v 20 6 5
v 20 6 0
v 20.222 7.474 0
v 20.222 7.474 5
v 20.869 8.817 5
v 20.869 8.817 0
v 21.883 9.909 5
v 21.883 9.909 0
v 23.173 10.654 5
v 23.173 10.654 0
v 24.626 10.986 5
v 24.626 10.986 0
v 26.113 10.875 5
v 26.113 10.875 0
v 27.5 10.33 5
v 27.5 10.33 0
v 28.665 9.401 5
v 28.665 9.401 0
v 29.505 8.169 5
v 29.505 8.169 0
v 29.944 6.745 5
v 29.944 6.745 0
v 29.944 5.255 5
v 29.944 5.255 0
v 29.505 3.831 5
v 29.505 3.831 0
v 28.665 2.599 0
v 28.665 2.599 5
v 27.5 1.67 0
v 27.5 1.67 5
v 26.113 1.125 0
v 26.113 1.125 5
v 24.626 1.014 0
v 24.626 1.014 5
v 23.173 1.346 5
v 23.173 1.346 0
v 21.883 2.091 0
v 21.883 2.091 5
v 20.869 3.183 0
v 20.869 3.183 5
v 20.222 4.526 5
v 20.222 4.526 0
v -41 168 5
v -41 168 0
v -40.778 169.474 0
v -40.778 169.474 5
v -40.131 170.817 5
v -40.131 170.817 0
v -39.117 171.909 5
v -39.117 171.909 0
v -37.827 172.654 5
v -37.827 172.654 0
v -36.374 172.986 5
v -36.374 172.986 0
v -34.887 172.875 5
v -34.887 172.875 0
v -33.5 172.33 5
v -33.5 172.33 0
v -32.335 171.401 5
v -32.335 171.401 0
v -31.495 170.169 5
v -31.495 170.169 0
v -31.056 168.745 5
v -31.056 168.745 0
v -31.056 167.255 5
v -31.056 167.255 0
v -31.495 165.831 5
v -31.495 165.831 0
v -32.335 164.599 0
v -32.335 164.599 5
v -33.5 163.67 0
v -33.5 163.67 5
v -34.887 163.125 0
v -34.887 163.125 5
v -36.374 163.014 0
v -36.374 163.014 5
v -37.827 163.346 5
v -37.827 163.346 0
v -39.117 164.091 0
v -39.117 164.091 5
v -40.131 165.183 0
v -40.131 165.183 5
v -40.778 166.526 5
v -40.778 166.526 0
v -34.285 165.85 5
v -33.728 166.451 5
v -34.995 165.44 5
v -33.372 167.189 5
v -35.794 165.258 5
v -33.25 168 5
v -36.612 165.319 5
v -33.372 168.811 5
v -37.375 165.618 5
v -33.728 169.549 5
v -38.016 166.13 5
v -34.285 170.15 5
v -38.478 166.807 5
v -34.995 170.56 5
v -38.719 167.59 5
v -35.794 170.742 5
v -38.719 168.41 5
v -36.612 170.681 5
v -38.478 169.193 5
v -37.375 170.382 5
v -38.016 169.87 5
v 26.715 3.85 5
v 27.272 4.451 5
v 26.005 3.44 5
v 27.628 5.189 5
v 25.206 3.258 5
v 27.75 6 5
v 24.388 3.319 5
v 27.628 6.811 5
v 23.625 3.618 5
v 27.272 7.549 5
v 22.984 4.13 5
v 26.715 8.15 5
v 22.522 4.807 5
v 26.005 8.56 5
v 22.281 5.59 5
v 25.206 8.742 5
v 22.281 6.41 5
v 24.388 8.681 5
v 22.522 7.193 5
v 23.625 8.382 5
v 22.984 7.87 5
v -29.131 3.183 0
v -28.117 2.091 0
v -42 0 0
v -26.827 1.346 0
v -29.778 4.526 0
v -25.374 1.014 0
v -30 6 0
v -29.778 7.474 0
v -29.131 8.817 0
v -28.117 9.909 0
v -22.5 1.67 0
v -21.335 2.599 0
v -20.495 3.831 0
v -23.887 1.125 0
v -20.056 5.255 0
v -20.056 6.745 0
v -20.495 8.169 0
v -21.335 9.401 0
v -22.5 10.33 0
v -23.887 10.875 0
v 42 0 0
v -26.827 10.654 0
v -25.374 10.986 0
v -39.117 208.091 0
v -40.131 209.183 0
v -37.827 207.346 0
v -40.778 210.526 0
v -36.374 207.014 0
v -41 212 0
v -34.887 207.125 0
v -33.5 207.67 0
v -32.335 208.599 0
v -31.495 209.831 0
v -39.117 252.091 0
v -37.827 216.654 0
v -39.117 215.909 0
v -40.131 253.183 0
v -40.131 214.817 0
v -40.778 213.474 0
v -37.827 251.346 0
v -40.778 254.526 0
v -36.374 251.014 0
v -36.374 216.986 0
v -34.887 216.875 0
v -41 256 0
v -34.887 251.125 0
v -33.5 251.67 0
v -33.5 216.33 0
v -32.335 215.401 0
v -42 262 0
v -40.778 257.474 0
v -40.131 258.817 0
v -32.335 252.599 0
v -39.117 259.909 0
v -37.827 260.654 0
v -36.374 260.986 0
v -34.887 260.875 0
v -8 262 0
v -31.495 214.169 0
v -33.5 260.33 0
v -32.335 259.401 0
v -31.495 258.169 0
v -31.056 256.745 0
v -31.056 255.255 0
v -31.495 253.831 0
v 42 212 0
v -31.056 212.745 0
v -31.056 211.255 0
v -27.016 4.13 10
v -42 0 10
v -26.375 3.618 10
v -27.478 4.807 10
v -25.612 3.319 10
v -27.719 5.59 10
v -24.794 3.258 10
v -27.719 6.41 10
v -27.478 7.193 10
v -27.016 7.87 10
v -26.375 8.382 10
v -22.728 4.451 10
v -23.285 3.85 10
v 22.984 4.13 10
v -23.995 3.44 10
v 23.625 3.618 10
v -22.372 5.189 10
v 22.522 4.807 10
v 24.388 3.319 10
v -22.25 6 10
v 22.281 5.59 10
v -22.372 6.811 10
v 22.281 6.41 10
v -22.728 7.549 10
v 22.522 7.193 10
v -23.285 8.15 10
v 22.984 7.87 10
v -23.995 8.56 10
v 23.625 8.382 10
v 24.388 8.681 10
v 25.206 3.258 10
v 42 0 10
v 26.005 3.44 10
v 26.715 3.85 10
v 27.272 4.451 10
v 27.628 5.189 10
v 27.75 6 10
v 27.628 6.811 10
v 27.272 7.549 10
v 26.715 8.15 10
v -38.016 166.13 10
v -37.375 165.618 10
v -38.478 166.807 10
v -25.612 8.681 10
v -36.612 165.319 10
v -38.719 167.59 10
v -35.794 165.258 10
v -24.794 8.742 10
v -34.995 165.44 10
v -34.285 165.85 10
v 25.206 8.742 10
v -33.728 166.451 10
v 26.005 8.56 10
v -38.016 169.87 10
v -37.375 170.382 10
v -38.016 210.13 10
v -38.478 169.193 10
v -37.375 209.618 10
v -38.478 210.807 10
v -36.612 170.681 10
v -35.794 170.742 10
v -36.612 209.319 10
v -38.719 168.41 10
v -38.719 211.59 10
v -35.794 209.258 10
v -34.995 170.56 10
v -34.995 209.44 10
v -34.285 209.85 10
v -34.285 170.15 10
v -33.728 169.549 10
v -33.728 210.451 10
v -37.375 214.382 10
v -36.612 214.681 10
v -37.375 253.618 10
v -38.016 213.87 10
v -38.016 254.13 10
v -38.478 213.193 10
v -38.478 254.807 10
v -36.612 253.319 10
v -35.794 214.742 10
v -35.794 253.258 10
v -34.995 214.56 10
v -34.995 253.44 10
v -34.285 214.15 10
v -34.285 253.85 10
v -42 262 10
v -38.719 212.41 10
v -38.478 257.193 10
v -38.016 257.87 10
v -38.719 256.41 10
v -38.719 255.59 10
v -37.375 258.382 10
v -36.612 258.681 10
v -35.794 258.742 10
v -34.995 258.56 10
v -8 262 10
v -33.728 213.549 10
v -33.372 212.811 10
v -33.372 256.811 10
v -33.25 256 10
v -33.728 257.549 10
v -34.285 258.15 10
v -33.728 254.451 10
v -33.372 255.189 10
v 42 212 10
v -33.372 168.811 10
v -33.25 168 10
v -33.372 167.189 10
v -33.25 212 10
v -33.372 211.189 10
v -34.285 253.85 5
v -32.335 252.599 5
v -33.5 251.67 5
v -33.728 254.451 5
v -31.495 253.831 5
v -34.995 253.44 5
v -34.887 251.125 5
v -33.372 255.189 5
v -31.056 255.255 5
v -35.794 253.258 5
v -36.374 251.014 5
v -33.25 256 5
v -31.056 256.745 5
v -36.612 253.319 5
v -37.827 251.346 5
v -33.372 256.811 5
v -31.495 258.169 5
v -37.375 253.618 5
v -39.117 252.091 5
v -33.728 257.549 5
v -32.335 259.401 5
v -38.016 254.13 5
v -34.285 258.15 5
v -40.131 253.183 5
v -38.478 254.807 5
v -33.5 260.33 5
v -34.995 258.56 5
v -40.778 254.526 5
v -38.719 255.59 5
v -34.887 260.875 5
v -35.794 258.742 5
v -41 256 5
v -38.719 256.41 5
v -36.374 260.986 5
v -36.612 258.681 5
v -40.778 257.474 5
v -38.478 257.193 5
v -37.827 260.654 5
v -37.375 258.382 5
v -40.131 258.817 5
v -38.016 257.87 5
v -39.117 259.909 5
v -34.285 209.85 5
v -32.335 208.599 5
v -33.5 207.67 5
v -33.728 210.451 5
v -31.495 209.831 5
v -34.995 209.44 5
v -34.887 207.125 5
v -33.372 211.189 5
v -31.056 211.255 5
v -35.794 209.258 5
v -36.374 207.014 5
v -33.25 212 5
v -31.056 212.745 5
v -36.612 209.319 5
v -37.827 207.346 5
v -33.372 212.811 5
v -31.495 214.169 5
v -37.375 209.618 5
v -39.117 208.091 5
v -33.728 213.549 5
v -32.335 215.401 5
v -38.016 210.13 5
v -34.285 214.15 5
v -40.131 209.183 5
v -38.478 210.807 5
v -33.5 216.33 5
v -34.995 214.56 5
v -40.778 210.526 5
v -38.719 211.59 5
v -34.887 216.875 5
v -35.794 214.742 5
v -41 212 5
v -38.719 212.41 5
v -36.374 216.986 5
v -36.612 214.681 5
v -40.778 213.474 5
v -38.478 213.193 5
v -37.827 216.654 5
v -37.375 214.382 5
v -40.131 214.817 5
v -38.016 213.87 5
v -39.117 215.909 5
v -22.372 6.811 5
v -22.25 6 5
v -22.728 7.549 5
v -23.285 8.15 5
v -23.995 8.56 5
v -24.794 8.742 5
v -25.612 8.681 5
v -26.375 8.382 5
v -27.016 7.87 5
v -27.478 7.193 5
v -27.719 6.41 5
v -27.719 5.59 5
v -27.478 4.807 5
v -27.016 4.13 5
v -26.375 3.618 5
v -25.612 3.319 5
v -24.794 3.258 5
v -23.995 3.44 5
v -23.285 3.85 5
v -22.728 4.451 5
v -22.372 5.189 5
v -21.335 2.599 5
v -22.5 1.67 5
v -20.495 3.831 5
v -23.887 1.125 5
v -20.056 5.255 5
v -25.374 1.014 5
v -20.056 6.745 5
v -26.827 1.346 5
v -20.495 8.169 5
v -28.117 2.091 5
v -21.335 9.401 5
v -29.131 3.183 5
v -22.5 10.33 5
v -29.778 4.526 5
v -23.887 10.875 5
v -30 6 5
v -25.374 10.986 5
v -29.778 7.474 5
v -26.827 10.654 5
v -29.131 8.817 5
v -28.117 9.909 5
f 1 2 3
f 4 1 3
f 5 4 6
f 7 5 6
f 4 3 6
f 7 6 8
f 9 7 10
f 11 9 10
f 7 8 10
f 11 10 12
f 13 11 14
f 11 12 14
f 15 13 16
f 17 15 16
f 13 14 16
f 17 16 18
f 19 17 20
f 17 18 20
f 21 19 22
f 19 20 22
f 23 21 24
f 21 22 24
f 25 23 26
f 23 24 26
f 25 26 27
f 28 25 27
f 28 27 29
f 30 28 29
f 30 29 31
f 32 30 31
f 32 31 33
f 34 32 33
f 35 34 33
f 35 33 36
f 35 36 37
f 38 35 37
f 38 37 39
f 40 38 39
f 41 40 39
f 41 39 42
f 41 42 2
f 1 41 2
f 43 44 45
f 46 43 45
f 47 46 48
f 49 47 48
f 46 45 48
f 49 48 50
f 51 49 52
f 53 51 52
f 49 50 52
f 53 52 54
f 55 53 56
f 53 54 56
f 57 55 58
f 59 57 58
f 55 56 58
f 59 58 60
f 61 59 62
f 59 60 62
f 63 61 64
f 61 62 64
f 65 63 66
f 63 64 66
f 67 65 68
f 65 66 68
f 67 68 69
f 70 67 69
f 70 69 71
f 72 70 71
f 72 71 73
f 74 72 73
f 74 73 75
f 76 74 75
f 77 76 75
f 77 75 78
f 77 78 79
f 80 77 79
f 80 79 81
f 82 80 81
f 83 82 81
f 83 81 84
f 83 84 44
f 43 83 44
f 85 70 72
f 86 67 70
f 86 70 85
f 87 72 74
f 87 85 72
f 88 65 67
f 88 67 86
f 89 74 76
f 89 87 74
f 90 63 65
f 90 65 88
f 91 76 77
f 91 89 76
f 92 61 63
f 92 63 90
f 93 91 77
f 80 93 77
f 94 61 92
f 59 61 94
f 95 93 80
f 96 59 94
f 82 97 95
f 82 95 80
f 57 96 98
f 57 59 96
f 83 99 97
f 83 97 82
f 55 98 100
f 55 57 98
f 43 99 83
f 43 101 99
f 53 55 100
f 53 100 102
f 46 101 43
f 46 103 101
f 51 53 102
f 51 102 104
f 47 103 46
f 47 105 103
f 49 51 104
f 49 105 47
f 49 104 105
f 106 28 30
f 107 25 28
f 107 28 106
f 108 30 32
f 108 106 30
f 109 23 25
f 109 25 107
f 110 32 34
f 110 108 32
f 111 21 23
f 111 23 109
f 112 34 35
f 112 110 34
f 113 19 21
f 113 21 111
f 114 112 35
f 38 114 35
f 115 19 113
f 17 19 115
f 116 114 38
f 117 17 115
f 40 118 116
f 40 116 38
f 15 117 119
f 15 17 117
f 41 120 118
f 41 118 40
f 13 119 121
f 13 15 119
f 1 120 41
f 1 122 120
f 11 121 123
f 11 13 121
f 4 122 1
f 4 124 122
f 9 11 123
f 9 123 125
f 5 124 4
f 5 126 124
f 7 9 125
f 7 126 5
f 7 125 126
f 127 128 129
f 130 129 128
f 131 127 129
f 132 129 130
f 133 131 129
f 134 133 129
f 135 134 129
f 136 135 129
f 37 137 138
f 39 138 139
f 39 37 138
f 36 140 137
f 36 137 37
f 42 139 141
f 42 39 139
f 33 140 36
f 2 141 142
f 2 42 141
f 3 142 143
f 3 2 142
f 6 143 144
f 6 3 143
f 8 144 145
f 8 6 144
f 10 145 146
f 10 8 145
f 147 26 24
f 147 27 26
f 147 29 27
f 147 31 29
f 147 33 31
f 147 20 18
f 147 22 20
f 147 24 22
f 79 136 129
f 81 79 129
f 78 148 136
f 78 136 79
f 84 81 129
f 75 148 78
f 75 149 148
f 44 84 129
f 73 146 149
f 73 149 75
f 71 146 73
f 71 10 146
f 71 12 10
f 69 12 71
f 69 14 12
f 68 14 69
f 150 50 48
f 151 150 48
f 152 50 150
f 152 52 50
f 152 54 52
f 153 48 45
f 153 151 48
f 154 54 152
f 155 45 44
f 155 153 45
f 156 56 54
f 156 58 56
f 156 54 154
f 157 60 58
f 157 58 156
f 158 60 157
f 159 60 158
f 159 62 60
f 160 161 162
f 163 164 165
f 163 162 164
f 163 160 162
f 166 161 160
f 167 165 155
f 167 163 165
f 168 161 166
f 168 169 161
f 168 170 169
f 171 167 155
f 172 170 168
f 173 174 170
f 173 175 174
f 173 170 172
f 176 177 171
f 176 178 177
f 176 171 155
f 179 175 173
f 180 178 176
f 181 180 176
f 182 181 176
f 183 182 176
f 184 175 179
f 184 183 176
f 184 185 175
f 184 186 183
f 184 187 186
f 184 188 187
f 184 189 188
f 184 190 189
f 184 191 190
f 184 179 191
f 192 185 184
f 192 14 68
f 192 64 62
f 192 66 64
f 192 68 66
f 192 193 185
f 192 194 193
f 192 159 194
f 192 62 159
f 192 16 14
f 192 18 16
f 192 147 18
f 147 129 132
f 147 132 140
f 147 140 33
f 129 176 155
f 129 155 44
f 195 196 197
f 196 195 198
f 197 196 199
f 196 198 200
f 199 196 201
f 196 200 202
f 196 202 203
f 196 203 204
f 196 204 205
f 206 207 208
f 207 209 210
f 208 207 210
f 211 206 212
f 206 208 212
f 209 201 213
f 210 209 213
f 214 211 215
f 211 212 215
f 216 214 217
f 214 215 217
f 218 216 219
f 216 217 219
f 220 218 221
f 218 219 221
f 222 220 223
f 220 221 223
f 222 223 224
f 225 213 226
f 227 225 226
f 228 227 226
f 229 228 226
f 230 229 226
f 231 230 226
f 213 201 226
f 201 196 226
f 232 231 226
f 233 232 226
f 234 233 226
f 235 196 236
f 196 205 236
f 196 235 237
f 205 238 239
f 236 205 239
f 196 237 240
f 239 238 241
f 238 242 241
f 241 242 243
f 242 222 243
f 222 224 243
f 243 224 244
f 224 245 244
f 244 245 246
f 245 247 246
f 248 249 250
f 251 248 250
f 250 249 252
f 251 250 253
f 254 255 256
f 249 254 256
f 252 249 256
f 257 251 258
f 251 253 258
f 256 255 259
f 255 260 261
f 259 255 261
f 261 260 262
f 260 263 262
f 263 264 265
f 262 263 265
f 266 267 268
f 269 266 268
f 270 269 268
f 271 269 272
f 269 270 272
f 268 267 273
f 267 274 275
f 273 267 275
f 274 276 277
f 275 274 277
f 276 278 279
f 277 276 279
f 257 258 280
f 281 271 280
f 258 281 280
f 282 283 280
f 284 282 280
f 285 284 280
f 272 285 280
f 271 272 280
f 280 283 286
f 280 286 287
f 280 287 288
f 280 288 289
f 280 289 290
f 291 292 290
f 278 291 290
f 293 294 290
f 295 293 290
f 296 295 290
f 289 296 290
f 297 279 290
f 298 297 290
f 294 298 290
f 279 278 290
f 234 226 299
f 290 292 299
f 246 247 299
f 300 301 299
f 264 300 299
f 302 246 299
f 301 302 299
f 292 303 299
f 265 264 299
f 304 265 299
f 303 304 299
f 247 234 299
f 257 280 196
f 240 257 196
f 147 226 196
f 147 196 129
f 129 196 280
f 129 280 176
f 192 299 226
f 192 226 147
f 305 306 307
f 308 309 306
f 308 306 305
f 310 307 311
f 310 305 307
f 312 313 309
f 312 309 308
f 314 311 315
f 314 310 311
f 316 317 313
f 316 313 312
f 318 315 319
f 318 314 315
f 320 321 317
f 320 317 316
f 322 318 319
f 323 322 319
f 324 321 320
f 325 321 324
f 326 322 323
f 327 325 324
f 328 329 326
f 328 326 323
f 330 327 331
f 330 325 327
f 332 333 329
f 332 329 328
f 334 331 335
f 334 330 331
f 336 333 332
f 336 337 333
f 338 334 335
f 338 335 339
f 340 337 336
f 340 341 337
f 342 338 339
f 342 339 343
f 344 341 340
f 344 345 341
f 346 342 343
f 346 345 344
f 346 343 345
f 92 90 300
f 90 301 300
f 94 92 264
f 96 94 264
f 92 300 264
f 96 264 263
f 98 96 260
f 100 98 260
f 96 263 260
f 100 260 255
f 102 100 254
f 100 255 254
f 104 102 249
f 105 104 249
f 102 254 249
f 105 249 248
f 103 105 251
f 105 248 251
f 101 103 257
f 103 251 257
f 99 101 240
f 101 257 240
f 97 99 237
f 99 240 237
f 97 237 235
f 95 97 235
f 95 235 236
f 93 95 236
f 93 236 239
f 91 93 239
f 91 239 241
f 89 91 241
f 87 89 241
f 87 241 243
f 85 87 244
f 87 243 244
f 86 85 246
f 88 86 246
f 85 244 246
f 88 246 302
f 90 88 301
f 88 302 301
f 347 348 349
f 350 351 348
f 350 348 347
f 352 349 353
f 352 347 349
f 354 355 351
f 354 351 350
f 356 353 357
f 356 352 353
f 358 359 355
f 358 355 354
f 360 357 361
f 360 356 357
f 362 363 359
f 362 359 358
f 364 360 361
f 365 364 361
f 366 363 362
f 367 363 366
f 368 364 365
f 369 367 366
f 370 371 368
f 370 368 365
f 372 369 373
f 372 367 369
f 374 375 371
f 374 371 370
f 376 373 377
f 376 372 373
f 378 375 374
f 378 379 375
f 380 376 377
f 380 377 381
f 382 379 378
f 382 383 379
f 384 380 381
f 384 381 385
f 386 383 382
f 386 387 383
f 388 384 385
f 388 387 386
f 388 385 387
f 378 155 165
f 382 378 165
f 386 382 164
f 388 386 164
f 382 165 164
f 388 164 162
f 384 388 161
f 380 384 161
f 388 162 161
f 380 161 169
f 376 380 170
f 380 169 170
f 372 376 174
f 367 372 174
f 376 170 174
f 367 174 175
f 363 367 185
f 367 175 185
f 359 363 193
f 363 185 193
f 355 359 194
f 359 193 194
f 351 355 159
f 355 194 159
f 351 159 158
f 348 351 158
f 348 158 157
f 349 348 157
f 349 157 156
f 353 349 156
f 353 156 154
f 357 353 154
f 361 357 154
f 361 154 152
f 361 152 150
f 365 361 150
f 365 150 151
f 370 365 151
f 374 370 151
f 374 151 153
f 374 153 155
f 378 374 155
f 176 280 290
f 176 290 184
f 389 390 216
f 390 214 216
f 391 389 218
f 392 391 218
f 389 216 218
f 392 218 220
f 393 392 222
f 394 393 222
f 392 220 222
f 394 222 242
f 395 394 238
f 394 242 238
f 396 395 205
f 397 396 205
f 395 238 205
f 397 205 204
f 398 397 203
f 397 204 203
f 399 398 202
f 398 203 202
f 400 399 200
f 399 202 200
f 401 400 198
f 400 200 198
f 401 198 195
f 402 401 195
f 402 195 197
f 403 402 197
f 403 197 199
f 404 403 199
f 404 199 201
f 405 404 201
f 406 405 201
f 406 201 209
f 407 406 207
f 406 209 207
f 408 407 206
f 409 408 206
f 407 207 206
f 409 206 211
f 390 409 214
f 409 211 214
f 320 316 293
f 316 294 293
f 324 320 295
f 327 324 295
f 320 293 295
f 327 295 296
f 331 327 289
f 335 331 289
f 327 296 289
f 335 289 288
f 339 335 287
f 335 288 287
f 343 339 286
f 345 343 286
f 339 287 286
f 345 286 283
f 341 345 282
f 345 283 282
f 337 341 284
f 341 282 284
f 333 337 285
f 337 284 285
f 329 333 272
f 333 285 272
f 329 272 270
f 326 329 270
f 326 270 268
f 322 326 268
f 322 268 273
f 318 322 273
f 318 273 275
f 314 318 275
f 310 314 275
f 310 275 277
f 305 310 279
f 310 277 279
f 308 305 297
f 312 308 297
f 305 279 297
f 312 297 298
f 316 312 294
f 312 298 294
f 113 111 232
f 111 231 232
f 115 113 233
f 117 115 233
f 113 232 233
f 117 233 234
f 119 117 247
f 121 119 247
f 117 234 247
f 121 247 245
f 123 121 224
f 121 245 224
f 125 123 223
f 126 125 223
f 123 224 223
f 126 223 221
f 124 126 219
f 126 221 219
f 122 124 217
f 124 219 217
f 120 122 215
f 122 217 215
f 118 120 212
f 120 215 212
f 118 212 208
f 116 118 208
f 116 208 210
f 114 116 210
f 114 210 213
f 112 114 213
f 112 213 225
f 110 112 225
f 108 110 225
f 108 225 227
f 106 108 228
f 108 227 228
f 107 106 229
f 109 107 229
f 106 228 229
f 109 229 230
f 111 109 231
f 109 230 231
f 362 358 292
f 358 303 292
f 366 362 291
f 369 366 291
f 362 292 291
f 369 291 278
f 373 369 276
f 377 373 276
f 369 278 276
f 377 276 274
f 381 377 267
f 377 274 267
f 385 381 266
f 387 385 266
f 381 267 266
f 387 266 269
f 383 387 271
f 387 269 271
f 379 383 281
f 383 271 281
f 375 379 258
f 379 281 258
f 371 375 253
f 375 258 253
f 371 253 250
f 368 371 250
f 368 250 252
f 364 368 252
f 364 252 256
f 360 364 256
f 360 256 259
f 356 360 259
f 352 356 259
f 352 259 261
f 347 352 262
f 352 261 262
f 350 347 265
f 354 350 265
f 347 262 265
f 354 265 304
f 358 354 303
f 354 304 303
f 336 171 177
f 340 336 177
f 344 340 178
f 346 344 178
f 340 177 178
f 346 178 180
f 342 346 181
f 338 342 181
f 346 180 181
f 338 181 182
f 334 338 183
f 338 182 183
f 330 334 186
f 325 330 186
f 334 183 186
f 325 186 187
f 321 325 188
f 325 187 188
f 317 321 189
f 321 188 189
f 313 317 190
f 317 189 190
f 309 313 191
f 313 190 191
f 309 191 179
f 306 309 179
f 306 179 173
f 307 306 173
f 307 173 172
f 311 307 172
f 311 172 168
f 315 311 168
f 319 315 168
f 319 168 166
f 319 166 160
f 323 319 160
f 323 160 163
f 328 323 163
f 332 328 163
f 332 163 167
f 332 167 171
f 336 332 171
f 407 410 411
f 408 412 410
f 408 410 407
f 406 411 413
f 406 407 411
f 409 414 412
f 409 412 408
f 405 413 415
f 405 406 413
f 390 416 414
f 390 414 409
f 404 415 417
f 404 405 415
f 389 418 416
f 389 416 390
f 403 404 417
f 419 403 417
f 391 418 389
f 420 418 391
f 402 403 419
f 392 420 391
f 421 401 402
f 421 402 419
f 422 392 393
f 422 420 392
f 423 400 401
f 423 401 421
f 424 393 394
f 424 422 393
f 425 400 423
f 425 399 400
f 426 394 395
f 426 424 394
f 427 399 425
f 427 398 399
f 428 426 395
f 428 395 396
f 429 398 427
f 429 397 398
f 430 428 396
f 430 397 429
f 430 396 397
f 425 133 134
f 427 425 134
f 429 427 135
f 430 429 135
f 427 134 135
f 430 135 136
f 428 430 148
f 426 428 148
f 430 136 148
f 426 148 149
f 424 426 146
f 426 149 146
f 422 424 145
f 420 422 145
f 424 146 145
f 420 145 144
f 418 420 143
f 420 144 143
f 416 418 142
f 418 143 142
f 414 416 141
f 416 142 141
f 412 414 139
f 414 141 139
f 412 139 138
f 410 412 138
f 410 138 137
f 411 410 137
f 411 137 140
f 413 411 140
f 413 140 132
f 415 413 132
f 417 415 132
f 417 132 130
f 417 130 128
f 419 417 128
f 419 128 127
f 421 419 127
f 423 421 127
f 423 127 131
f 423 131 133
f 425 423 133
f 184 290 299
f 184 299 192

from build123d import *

# Parameters (mm, degrees)
SKETCH1_W                                       = 10
SKETCH1_H                                       = 262
BOSS_EXTRUDE1_DEPTH                             = 42
CBORE_FOR_M5_SOCKET_HEAD_CAP_SCREW1_D           = 5.5
CBORE_FOR_M5_SOCKET_HEAD_CAP_SCREW1_CBORE_D     = 10
CBORE_FOR_M5_SOCKET_HEAD_CAP_SCREW1_CBORE_DEPTH = 5
CBORE_FOR_M5_SOCKET_HEAD_CAP_SCREW2_D           = 5.5
CBORE_FOR_M5_SOCKET_HEAD_CAP_SCREW2_CBORE_D     = 10
CBORE_FOR_M5_SOCKET_HEAD_CAP_SCREW2_CBORE_DEPTH = 5
CHAMFER1_SIZE                                   = 50


with BuildPart() as part:
    # Sketch1 → Boss-Extrude1 (new, symmetric)
    with BuildSketch(Plane(origin=(0, 0, 0), x_dir=(0, 0, -1), z_dir=(1, 0, 0))):
        with Locations((-5, 131)):
            Rectangle(SKETCH1_W, SKETCH1_H)
    extrude(amount=BOSS_EXTRUDE1_DEPTH, both=True)

    # CBORE for M5 Socket Head Cap Screw1 (through all)
    with Locations(Plane(origin=(0, 0, 0), x_dir=(-1, 0, 0), z_dir=(0, 0, -1))):
        with Locations((36, 256), (36, 212), (36, 168)):
            CounterBoreHole(CBORE_FOR_M5_SOCKET_HEAD_CAP_SCREW1_D / 2, CBORE_FOR_M5_SOCKET_HEAD_CAP_SCREW1_CBORE_D / 2, CBORE_FOR_M5_SOCKET_HEAD_CAP_SCREW1_CBORE_DEPTH)

    # CBORE for M5 Socket Head Cap Screw2 (through all)
    with Locations(Plane(origin=(0, 0, 0), x_dir=(-1, 0, 0), z_dir=(0, 0, -1))):
        with Locations((-25, 6), (25, 6)):
            CounterBoreHole(CBORE_FOR_M5_SOCKET_HEAD_CAP_SCREW2_D / 2, CBORE_FOR_M5_SOCKET_HEAD_CAP_SCREW2_CBORE_D / 2, CBORE_FOR_M5_SOCKET_HEAD_CAP_SCREW2_CBORE_DEPTH)

    # Chamfer1
    chamfer1_edges = [part.edges().sort_by_distance(p)[0] for p in [
        (42, 262, 5),
    ]]
    chamfer(chamfer1_edges, length=CHAMFER1_SIZE)


solid = part.part
